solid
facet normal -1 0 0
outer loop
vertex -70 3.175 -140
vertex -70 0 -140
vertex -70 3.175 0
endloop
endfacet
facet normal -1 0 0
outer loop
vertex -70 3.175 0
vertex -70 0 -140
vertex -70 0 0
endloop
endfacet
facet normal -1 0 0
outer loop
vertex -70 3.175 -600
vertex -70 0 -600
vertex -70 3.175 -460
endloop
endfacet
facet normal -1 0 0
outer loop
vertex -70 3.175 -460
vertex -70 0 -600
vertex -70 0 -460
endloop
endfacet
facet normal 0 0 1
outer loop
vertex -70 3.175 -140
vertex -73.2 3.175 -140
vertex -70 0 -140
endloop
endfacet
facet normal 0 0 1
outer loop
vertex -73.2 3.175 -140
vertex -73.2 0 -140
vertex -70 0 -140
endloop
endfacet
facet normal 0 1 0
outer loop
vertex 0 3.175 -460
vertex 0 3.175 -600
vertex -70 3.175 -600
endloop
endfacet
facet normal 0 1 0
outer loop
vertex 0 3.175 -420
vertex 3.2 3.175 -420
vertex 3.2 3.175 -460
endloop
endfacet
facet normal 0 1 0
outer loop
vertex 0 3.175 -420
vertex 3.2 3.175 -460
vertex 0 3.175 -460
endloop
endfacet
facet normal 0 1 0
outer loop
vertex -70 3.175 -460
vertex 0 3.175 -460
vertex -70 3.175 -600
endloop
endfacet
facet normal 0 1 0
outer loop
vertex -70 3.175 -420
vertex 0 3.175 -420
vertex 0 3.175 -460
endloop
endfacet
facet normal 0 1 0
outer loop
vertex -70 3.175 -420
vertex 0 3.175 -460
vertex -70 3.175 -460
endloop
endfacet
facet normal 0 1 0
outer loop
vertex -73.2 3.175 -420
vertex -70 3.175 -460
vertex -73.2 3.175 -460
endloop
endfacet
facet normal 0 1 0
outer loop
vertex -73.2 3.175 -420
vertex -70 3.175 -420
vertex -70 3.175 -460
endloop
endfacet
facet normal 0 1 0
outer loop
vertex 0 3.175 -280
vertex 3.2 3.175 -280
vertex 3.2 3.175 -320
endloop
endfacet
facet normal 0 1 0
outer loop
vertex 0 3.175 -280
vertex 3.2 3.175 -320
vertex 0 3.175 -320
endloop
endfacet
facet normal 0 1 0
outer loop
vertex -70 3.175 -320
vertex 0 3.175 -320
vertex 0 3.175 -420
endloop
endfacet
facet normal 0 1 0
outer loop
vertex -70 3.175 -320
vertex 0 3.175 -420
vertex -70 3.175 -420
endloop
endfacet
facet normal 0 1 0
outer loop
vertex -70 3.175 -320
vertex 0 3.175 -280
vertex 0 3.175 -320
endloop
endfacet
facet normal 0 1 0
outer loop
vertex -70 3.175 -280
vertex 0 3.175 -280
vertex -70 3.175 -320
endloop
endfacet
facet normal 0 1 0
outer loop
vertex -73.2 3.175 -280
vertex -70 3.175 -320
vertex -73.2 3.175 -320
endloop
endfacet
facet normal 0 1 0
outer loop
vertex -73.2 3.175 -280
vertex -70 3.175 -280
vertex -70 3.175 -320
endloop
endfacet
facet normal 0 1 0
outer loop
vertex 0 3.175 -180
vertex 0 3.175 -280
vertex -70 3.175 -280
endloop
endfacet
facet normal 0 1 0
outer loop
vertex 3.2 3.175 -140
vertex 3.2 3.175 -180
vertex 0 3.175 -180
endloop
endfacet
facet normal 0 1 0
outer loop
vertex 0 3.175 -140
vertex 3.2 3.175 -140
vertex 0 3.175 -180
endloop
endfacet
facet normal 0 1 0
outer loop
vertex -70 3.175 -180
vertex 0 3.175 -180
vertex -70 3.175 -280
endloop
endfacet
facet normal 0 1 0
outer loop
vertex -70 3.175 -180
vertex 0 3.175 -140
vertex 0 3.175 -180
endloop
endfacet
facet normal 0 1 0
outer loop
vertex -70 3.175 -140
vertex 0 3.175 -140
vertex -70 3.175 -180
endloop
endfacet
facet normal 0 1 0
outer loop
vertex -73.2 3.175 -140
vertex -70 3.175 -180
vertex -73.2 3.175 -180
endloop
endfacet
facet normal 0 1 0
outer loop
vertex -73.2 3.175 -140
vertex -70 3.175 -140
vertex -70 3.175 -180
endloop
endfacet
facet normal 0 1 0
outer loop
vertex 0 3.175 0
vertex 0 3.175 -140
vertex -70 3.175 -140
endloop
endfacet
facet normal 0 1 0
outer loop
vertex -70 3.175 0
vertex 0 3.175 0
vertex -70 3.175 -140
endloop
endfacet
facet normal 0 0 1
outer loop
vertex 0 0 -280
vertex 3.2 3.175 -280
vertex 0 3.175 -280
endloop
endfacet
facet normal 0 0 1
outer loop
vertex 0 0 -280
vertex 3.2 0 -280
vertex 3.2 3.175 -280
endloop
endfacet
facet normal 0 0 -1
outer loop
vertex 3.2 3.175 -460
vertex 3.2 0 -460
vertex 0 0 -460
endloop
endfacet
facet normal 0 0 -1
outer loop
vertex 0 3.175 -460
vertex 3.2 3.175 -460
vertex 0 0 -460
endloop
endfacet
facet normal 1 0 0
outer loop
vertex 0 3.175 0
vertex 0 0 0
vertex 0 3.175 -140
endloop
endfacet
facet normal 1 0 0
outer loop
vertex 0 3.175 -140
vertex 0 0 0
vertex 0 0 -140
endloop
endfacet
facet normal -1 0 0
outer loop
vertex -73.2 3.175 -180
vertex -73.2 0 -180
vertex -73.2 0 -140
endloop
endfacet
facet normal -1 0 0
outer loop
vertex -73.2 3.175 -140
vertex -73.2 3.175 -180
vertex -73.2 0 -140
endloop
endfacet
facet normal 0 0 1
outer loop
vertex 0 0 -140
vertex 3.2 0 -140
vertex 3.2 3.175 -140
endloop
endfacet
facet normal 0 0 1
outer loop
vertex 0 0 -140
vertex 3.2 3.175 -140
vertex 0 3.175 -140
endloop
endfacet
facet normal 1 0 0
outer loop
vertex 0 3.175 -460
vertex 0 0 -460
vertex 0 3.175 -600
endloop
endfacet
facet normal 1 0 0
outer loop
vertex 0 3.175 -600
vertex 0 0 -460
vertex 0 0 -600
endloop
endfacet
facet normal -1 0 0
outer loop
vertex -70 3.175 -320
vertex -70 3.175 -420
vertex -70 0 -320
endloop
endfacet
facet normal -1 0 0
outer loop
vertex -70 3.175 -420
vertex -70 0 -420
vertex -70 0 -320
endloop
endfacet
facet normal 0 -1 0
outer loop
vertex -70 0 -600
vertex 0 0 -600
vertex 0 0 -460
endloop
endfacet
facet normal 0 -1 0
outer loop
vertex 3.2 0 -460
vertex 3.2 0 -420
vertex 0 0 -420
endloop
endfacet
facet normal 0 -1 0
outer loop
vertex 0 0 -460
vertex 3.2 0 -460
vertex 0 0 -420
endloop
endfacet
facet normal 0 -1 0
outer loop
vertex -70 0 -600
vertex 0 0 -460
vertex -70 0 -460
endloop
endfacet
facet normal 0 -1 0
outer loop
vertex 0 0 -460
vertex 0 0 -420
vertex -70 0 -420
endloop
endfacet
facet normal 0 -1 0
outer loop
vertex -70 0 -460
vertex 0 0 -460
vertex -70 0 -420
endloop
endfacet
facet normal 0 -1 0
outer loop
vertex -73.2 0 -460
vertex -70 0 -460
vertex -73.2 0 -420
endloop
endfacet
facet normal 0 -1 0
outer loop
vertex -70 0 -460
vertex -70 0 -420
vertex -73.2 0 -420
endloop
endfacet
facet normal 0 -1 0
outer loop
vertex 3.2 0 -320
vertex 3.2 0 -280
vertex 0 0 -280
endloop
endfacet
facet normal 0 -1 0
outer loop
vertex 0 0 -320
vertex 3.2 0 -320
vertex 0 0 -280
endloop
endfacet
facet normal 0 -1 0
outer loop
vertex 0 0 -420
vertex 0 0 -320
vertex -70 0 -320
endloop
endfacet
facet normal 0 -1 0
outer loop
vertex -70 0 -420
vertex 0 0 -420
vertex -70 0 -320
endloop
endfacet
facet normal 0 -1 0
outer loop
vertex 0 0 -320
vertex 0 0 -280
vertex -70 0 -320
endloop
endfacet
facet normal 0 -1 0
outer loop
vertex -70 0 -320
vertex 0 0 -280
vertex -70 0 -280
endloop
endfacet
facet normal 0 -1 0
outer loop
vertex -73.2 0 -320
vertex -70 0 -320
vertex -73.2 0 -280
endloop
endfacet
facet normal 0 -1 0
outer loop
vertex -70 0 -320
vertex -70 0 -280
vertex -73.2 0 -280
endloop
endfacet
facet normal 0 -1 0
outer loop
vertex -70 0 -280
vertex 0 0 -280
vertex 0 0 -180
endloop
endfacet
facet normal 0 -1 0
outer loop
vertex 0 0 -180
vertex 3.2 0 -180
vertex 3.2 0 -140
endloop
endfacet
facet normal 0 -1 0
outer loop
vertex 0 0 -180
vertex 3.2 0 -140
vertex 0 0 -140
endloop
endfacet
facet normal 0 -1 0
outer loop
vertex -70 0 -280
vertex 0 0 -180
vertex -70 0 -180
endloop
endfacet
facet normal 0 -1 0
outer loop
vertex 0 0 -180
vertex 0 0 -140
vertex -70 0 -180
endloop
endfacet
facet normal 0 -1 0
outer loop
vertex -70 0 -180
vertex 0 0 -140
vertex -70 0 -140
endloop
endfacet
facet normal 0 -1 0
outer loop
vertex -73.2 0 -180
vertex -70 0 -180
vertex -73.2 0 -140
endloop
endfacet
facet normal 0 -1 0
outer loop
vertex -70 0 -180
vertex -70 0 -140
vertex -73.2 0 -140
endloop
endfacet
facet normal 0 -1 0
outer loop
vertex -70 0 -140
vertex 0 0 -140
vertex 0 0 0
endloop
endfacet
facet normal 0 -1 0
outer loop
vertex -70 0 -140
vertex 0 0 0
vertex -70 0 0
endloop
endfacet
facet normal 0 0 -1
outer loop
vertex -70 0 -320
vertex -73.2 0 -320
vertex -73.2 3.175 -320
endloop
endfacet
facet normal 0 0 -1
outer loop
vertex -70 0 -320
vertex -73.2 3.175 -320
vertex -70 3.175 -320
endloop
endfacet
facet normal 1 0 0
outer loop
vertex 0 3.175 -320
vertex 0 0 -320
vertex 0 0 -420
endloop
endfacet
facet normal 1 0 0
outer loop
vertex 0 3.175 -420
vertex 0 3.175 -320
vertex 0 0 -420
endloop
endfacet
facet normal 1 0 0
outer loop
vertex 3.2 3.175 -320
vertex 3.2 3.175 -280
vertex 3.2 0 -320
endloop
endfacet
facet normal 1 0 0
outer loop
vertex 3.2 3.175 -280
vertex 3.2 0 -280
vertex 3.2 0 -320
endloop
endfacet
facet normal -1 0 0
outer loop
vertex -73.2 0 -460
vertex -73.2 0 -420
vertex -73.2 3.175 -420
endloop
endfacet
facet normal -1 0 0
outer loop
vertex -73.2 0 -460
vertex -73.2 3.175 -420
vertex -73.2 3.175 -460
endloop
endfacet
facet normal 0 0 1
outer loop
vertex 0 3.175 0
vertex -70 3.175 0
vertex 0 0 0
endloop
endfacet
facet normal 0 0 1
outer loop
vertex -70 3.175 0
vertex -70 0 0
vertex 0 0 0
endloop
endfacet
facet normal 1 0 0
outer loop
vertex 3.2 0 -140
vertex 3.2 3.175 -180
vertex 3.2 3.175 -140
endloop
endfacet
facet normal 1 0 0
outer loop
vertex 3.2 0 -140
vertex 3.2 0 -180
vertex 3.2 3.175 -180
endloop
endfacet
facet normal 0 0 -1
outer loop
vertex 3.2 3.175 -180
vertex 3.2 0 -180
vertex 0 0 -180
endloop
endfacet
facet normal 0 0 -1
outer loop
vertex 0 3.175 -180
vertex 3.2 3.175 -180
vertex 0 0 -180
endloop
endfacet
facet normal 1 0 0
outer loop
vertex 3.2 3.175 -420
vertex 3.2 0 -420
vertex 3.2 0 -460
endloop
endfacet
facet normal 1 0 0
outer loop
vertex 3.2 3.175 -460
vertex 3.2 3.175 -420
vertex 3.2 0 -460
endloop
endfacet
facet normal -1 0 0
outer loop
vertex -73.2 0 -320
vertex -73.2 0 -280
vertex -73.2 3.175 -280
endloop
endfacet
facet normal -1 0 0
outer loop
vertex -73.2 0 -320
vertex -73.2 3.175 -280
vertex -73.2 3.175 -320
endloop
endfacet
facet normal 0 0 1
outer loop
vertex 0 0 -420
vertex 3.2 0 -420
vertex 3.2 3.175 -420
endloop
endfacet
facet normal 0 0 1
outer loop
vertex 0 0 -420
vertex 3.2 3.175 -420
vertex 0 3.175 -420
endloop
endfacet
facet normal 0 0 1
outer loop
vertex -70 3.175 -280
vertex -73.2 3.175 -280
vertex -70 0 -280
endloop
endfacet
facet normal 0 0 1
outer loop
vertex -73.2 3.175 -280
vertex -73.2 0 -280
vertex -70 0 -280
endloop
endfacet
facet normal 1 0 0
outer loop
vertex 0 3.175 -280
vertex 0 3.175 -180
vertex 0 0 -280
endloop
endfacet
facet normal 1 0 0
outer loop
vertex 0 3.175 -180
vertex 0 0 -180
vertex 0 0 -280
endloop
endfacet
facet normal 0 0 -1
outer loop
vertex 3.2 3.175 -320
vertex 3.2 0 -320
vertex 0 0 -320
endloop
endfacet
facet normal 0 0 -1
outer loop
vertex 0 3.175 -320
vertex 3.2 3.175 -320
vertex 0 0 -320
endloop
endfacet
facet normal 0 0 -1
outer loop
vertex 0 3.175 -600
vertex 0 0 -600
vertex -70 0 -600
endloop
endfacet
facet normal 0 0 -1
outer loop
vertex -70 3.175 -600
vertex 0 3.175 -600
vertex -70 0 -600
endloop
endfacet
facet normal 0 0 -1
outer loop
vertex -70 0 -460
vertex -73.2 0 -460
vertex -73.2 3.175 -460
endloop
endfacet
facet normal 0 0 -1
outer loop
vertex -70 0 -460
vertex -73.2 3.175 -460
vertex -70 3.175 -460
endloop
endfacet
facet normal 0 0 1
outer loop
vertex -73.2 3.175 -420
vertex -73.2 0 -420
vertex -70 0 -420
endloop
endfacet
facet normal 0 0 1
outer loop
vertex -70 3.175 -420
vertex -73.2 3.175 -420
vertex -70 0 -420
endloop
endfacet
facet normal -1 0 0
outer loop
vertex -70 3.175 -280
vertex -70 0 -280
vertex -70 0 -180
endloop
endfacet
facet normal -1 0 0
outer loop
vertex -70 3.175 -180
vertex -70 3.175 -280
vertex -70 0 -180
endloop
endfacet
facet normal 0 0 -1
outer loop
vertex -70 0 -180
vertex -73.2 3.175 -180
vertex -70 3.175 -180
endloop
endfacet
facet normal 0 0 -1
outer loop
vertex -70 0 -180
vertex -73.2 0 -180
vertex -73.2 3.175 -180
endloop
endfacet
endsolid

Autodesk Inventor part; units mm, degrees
ref_plane "YZ Plane" through (0, 0, 0) normal (1, 0, 0) x (0, 1, 0)
ref_plane "XZ Plane" through (0, 0, 0) normal (0, 1, 0) x (-1, 0, 0)
ref_plane "XY Plane" through (0, 0, 0) normal (0, 0, 1) x (1, 0, 0)
sketch "Sketch1" plane through (0, 0, 0) normal (0, 1, 0) x (-1, 0, 0)
  line L0 (0, 0) -> (0, -600)
  line L1 (0, -600) -> (70, -600)
  line L2 (70, -600) -> (70, 0)
  line L3 (70, 0) -> (0, 0)
  line L4 (0, 0) -> (0, -300)
  line L5 (-3.2, -280) -> (-3.2, -320)
  line L6 (-3.2, -320) -> (0, -320)
  line L7 (-3.2, -280) -> (0, -280)
  line L8 (-3.2, -420) -> (0, -420)
  line L9 (-3.2, -420) -> (-3.2, -460)
  line L10 (-3.2, -460) -> (0, -460)
  line L11 (-3.2, -180) -> (0, -180)
  line L12 (-3.2, -180) -> (-3.2, -140)
  line L13 (-3.2, -140) -> (0, -140)
  line L14 (73.2, -280) -> (73.2, -320)
  line L15 (73.2, -320) -> (70, -320)
  line L16 (73.2, -280) -> (70, -280)
  line L17 (73.2, -420) -> (70, -420)
  line L18 (73.2, -420) -> (73.2, -460)
  line L19 (73.2, -460) -> (70, -460)
  line L20 (73.2, -180) -> (70, -180)
  line L21 (73.2, -180) -> (73.2, -140)
  line L22 (73.2, -140) -> (70, -140)
  dimension "d0" = 600
  dimension "d2" = 70
  dimension "d3" = 600
  dimension "d7" = 40
  dimension "d8" = 100
  dimension "d9" = 40
  dimension "d10" = 100
  dimension "d11" = 40
extrude "Extrusion1" add sketch "Sketch1" along normal blind 3.175
properties part number "Trebuchet V1 - Runway"
